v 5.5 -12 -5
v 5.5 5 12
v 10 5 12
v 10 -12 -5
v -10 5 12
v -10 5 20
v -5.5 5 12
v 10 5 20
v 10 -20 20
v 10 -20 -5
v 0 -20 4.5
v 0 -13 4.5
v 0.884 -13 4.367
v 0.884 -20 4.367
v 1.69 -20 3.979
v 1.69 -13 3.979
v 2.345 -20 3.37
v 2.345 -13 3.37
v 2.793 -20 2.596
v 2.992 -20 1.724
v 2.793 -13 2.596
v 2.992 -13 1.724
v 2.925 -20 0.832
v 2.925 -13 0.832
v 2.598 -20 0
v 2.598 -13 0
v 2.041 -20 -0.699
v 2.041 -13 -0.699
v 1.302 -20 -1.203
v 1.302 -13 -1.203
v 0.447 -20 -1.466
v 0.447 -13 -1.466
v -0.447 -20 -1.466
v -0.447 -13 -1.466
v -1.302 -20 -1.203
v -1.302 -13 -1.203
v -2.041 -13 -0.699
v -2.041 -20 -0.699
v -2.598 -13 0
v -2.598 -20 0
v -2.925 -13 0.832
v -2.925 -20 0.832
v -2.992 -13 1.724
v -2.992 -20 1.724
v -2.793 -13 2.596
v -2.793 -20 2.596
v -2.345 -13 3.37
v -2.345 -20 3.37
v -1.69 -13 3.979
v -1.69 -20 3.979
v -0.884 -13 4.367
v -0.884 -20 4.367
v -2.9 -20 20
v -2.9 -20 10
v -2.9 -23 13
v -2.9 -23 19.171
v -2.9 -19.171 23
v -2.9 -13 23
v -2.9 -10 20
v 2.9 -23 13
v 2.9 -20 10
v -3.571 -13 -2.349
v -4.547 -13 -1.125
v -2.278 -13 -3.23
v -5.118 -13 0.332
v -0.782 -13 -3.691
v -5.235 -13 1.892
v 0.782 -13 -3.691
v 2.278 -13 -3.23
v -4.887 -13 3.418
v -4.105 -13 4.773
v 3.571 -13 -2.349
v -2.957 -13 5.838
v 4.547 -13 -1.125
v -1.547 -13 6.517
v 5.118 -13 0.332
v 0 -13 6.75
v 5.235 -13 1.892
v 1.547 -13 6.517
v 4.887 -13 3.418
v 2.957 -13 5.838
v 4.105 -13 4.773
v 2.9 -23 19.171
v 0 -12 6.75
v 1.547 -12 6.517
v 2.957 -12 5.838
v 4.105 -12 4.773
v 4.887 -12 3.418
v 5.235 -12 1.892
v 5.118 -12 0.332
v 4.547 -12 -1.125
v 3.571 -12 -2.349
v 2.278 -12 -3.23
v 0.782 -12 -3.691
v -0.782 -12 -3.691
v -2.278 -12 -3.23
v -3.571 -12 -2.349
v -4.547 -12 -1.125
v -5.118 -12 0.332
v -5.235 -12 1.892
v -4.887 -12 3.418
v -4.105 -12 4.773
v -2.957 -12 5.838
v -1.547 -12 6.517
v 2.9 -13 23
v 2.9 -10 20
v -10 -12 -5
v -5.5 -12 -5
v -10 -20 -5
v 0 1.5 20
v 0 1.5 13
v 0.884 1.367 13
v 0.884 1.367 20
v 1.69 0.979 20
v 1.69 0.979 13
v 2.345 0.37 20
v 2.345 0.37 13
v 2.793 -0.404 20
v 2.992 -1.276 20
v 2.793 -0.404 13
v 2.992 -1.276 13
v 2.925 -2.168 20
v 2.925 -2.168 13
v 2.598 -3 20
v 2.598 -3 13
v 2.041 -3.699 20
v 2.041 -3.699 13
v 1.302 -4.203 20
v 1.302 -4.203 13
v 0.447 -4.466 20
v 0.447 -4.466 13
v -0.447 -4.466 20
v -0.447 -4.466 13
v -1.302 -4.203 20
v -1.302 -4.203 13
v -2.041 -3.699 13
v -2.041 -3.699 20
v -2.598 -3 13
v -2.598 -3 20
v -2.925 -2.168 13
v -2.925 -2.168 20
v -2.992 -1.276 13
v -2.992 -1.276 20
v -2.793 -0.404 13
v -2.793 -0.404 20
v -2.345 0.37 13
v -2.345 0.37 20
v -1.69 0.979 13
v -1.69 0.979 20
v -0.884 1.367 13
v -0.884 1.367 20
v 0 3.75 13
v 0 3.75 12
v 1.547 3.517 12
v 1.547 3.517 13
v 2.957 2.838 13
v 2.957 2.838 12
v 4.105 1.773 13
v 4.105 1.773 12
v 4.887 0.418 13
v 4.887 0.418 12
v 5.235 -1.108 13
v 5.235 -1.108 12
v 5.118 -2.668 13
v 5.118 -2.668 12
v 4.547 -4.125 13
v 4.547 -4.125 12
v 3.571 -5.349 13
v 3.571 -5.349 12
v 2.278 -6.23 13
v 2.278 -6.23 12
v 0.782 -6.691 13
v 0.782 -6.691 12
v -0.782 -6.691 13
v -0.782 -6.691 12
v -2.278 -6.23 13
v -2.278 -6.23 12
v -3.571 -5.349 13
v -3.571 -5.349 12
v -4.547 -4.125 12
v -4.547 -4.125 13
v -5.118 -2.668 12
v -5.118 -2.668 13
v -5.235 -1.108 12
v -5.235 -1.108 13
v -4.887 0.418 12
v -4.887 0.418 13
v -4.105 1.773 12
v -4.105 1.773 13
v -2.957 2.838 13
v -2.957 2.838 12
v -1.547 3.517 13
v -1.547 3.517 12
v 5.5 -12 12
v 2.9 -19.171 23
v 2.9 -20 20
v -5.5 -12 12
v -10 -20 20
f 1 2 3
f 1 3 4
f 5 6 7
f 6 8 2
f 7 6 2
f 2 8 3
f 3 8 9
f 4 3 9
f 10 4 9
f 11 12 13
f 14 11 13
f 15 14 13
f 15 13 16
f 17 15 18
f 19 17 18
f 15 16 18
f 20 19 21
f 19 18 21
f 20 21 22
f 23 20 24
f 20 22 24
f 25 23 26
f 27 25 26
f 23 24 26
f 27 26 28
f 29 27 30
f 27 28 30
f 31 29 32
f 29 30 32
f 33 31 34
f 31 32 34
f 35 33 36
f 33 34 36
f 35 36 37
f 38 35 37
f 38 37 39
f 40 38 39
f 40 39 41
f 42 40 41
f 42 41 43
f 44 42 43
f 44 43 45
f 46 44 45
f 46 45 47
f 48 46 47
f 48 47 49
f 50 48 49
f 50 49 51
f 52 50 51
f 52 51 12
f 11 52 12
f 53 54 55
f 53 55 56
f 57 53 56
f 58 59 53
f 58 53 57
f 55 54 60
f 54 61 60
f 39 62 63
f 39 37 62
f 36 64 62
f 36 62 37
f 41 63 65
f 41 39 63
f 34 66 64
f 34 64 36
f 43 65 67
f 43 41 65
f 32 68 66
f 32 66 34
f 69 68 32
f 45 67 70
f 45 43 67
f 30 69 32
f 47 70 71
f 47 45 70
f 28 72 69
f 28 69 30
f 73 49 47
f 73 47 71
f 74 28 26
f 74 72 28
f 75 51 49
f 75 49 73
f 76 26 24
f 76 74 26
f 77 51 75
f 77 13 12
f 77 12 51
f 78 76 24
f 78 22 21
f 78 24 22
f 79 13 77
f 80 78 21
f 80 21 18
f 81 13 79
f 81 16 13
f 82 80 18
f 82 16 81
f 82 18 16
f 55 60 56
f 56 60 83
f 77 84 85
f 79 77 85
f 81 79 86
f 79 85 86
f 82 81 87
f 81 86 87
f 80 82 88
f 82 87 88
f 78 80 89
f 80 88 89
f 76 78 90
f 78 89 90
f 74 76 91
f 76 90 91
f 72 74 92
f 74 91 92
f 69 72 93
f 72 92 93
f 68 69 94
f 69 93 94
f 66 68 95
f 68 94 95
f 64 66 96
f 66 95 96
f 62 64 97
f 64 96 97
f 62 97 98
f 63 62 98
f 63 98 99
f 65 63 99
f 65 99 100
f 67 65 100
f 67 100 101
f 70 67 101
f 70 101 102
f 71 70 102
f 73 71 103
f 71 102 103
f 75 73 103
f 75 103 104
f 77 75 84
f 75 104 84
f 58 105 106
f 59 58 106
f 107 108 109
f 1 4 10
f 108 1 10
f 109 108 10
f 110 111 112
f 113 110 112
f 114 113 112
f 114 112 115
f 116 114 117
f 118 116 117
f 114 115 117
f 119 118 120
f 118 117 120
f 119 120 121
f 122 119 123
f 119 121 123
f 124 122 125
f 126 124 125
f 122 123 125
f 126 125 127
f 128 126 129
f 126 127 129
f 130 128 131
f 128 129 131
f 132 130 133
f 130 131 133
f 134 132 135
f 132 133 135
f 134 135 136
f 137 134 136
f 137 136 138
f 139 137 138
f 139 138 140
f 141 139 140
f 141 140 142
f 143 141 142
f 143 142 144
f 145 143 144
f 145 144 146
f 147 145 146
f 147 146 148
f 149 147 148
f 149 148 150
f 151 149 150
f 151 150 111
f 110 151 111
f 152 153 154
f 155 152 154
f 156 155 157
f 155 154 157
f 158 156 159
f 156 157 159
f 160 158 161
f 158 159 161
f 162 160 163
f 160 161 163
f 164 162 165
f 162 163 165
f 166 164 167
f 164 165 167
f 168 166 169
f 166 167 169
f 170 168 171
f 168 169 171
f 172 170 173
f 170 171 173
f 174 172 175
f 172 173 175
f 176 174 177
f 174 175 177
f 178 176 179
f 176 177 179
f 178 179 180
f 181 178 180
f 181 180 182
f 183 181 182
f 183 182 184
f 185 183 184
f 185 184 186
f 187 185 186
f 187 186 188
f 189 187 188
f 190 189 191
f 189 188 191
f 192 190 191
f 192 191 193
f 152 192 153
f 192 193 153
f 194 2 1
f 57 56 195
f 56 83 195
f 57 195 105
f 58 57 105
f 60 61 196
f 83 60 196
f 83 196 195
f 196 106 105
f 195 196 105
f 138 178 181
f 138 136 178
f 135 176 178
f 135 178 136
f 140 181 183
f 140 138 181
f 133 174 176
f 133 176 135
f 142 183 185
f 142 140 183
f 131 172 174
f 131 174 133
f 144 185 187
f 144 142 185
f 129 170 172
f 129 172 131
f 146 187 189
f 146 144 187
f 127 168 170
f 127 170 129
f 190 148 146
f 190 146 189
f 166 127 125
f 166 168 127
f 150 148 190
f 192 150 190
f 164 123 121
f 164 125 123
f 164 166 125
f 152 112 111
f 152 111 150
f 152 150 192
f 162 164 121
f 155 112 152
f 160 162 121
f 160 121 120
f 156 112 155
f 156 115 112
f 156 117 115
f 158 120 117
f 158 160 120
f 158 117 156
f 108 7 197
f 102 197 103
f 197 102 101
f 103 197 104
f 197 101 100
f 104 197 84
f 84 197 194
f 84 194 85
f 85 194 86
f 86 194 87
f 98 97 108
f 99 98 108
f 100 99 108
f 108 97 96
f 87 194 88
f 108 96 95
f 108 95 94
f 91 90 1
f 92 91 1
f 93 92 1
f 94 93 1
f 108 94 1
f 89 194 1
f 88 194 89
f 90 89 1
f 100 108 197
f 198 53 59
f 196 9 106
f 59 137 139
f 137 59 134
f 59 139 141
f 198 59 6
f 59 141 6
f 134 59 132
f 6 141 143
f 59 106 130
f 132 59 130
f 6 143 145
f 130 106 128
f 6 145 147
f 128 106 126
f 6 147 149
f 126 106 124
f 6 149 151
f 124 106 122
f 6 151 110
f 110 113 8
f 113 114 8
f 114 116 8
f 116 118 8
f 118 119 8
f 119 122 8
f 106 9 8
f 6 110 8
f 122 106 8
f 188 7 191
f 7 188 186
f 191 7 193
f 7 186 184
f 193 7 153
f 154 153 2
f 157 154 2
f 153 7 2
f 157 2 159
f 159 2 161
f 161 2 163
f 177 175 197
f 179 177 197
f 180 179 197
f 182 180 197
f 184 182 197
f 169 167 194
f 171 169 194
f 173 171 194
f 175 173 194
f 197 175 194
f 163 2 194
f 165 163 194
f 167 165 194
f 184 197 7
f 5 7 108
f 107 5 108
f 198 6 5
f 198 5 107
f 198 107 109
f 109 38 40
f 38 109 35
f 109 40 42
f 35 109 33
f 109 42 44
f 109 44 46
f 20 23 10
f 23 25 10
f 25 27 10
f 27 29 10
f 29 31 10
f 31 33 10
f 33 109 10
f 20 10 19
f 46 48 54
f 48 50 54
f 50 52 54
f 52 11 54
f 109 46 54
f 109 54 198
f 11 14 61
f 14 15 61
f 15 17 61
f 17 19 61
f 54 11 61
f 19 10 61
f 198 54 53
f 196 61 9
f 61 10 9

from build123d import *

# Parameters (mm, degrees)
BOSS_EXTRUDE1_DEPTH = 10
RIB18_REACH         = 36.641
SKETCH15_WALL_W     = 95.323662864
SKETCH15_WALL_H     = 4.5
RIB38_REACH         = 36.641
SKETCH17_WALL_W     = 95.323662864
SKETCH17_WALL_H     = 4.5
BOSS_EXTRUDE2_DEPTH = 2.9
SKETCH36_R          = 5.25
CUT_EXTRUDE4_DEPTH  = 1
SKETCH37_R          = 3
CUT_EXTRUDE5_DEPTH  = 8
SKETCH33_R          = 5.25
CUT_EXTRUDE1_DEPTH  = 1
SKETCH38_R          = 3
CUT_EXTRUDE6_DEPTH  = 8


with BuildPart() as part:
    # Sketch2 → Boss-Extrude1 (new, symmetric)
    with BuildSketch(Plane(origin=(0, 0, 0), x_dir=(0, 0, -1), z_dir=(1, 0, 0))):
        Polygon((-20, 5), (-12, 5), (-12, -12), (5, -12), (5, -20), (-20, -20), align=None)
    extrude(amount=BOSS_EXTRUDE1_DEPTH, both=True)

    # Sketch15 wall → Rib18 (add, up to next)
    with BuildSketch(Plane(origin=(10, -3.5, 3.5), x_dir=(0, -0.707106781187, -0.707106781187), z_dir=(0, 0.707106781187, -0.707106781187)), mode=Mode.PRIVATE) as rib18_sk1:
        with Locations((0, 2.25)):
            Rectangle(SKETCH15_WALL_W, SKETCH15_WALL_H)
    rib18_tool1 = extrude(rib18_sk1.sketch, amount=-RIB18_REACH, mode=Mode.PRIVATE) - part.part
    add(rib18_tool1.solids().sort_by_distance((10, -3.5, 3.5))[0])

    # Sketch17 wall → Rib38 (add, up to next)
    with BuildSketch(Plane(origin=(-10, -3.5, 3.5), x_dir=(0, -0.707106781187, -0.707106781187), z_dir=(0, -0.707106781187, 0.707106781187)), mode=Mode.PRIVATE) as rib38_sk1:
        with Locations((0, 2.25)):
            Rectangle(SKETCH17_WALL_W, SKETCH17_WALL_H)
    rib38_tool1 = extrude(rib38_sk1.sketch, amount=RIB38_REACH, mode=Mode.PRIVATE) - part.part
    add(rib38_tool1.solids().sort_by_distance((-10, -3.5, 3.5))[0])

    # Sketch31 → Boss-Extrude2 (add, symmetric)
    with BuildSketch(Plane(origin=(0, 0, 0), x_dir=(0, 0, -1), z_dir=(1, 0, 0))):
        Polygon((-20, -10), (-20, -20), (-10, -20), (-13, -23), (-19.170777974, -23), (-23, -19.170777974), (-23, -13), align=None)
    extrude(amount=BOSS_EXTRUDE2_DEPTH, both=True)

    # Sketch36 → Cut-Extrude4 (cut)
    with BuildSketch(Plane(origin=(0, 0, 12), x_dir=(-1, 0, 0), z_dir=(0, 0, -1))):
        with Locations(Location((0, -1.5, 0), (0, 0, 90))):
            Circle(SKETCH36_R)
    extrude(amount=-CUT_EXTRUDE4_DEPTH, mode=Mode.SUBTRACT)

    # Sketch37 → Cut-Extrude5 (cut)
    with BuildSketch(Plane(origin=(0, 0, 13), x_dir=(-1, 0, 0), z_dir=(0, 0, -1))):
        with Locations(Location((0, -1.5, 0), (0, 0, 90))):
            Circle(SKETCH37_R)
    extrude(amount=-CUT_EXTRUDE5_DEPTH, mode=Mode.SUBTRACT)

    # Sketch33 → Cut-Extrude1 (cut)
    with BuildSketch(Plane(origin=(0, -12, 0), x_dir=(1, 0, 0), z_dir=(0, 1, 0))):
        with Locations(Location((0, -1.5, 0), (0, 0, 270))):
            Circle(SKETCH33_R)
    extrude(amount=-CUT_EXTRUDE1_DEPTH, mode=Mode.SUBTRACT)

    # Sketch38 → Cut-Extrude6 (cut)
    with BuildSketch(Plane(origin=(0, -13, 0), x_dir=(1, 0, 0), z_dir=(0, 1, 0))):
        with Locations(Location((0, -1.5, 0), (0, 0, 270))):
            Circle(SKETCH38_R)
    extrude(amount=-CUT_EXTRUDE6_DEPTH, mode=Mode.SUBTRACT)


solid = part.part
